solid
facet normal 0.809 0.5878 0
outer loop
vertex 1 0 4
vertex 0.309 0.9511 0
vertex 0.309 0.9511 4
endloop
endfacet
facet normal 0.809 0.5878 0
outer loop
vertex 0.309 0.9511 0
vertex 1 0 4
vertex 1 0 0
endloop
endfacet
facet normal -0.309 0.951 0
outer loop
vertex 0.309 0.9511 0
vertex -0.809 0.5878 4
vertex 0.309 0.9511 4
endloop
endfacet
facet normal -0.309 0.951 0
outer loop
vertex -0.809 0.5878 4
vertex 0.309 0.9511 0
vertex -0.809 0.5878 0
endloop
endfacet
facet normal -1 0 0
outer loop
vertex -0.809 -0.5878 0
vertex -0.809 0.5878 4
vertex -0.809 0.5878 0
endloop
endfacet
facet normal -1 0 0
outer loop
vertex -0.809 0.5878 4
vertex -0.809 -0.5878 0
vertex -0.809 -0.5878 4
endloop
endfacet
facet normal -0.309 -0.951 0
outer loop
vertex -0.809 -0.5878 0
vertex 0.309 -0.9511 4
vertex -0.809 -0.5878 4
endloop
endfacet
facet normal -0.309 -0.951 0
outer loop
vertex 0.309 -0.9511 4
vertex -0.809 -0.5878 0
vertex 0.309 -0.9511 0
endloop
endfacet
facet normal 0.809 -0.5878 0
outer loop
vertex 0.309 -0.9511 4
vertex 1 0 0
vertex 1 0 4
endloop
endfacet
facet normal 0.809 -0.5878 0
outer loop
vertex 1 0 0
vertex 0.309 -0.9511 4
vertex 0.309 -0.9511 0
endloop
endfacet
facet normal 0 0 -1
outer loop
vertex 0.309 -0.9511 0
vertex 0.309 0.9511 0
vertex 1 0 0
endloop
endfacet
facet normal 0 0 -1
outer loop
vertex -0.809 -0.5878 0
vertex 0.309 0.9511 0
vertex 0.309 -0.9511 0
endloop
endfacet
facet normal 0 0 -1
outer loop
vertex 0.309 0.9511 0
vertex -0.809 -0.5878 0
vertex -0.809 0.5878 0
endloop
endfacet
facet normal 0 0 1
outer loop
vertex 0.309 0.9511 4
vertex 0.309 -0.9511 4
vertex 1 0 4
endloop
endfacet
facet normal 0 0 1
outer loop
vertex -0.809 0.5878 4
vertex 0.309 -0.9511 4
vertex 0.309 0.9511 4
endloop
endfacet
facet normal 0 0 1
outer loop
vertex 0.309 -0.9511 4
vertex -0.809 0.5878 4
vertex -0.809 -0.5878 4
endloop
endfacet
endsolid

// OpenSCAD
union() {
  translate([0, 0, 0]) cylinder(h=4, r=1, center=false);
}
